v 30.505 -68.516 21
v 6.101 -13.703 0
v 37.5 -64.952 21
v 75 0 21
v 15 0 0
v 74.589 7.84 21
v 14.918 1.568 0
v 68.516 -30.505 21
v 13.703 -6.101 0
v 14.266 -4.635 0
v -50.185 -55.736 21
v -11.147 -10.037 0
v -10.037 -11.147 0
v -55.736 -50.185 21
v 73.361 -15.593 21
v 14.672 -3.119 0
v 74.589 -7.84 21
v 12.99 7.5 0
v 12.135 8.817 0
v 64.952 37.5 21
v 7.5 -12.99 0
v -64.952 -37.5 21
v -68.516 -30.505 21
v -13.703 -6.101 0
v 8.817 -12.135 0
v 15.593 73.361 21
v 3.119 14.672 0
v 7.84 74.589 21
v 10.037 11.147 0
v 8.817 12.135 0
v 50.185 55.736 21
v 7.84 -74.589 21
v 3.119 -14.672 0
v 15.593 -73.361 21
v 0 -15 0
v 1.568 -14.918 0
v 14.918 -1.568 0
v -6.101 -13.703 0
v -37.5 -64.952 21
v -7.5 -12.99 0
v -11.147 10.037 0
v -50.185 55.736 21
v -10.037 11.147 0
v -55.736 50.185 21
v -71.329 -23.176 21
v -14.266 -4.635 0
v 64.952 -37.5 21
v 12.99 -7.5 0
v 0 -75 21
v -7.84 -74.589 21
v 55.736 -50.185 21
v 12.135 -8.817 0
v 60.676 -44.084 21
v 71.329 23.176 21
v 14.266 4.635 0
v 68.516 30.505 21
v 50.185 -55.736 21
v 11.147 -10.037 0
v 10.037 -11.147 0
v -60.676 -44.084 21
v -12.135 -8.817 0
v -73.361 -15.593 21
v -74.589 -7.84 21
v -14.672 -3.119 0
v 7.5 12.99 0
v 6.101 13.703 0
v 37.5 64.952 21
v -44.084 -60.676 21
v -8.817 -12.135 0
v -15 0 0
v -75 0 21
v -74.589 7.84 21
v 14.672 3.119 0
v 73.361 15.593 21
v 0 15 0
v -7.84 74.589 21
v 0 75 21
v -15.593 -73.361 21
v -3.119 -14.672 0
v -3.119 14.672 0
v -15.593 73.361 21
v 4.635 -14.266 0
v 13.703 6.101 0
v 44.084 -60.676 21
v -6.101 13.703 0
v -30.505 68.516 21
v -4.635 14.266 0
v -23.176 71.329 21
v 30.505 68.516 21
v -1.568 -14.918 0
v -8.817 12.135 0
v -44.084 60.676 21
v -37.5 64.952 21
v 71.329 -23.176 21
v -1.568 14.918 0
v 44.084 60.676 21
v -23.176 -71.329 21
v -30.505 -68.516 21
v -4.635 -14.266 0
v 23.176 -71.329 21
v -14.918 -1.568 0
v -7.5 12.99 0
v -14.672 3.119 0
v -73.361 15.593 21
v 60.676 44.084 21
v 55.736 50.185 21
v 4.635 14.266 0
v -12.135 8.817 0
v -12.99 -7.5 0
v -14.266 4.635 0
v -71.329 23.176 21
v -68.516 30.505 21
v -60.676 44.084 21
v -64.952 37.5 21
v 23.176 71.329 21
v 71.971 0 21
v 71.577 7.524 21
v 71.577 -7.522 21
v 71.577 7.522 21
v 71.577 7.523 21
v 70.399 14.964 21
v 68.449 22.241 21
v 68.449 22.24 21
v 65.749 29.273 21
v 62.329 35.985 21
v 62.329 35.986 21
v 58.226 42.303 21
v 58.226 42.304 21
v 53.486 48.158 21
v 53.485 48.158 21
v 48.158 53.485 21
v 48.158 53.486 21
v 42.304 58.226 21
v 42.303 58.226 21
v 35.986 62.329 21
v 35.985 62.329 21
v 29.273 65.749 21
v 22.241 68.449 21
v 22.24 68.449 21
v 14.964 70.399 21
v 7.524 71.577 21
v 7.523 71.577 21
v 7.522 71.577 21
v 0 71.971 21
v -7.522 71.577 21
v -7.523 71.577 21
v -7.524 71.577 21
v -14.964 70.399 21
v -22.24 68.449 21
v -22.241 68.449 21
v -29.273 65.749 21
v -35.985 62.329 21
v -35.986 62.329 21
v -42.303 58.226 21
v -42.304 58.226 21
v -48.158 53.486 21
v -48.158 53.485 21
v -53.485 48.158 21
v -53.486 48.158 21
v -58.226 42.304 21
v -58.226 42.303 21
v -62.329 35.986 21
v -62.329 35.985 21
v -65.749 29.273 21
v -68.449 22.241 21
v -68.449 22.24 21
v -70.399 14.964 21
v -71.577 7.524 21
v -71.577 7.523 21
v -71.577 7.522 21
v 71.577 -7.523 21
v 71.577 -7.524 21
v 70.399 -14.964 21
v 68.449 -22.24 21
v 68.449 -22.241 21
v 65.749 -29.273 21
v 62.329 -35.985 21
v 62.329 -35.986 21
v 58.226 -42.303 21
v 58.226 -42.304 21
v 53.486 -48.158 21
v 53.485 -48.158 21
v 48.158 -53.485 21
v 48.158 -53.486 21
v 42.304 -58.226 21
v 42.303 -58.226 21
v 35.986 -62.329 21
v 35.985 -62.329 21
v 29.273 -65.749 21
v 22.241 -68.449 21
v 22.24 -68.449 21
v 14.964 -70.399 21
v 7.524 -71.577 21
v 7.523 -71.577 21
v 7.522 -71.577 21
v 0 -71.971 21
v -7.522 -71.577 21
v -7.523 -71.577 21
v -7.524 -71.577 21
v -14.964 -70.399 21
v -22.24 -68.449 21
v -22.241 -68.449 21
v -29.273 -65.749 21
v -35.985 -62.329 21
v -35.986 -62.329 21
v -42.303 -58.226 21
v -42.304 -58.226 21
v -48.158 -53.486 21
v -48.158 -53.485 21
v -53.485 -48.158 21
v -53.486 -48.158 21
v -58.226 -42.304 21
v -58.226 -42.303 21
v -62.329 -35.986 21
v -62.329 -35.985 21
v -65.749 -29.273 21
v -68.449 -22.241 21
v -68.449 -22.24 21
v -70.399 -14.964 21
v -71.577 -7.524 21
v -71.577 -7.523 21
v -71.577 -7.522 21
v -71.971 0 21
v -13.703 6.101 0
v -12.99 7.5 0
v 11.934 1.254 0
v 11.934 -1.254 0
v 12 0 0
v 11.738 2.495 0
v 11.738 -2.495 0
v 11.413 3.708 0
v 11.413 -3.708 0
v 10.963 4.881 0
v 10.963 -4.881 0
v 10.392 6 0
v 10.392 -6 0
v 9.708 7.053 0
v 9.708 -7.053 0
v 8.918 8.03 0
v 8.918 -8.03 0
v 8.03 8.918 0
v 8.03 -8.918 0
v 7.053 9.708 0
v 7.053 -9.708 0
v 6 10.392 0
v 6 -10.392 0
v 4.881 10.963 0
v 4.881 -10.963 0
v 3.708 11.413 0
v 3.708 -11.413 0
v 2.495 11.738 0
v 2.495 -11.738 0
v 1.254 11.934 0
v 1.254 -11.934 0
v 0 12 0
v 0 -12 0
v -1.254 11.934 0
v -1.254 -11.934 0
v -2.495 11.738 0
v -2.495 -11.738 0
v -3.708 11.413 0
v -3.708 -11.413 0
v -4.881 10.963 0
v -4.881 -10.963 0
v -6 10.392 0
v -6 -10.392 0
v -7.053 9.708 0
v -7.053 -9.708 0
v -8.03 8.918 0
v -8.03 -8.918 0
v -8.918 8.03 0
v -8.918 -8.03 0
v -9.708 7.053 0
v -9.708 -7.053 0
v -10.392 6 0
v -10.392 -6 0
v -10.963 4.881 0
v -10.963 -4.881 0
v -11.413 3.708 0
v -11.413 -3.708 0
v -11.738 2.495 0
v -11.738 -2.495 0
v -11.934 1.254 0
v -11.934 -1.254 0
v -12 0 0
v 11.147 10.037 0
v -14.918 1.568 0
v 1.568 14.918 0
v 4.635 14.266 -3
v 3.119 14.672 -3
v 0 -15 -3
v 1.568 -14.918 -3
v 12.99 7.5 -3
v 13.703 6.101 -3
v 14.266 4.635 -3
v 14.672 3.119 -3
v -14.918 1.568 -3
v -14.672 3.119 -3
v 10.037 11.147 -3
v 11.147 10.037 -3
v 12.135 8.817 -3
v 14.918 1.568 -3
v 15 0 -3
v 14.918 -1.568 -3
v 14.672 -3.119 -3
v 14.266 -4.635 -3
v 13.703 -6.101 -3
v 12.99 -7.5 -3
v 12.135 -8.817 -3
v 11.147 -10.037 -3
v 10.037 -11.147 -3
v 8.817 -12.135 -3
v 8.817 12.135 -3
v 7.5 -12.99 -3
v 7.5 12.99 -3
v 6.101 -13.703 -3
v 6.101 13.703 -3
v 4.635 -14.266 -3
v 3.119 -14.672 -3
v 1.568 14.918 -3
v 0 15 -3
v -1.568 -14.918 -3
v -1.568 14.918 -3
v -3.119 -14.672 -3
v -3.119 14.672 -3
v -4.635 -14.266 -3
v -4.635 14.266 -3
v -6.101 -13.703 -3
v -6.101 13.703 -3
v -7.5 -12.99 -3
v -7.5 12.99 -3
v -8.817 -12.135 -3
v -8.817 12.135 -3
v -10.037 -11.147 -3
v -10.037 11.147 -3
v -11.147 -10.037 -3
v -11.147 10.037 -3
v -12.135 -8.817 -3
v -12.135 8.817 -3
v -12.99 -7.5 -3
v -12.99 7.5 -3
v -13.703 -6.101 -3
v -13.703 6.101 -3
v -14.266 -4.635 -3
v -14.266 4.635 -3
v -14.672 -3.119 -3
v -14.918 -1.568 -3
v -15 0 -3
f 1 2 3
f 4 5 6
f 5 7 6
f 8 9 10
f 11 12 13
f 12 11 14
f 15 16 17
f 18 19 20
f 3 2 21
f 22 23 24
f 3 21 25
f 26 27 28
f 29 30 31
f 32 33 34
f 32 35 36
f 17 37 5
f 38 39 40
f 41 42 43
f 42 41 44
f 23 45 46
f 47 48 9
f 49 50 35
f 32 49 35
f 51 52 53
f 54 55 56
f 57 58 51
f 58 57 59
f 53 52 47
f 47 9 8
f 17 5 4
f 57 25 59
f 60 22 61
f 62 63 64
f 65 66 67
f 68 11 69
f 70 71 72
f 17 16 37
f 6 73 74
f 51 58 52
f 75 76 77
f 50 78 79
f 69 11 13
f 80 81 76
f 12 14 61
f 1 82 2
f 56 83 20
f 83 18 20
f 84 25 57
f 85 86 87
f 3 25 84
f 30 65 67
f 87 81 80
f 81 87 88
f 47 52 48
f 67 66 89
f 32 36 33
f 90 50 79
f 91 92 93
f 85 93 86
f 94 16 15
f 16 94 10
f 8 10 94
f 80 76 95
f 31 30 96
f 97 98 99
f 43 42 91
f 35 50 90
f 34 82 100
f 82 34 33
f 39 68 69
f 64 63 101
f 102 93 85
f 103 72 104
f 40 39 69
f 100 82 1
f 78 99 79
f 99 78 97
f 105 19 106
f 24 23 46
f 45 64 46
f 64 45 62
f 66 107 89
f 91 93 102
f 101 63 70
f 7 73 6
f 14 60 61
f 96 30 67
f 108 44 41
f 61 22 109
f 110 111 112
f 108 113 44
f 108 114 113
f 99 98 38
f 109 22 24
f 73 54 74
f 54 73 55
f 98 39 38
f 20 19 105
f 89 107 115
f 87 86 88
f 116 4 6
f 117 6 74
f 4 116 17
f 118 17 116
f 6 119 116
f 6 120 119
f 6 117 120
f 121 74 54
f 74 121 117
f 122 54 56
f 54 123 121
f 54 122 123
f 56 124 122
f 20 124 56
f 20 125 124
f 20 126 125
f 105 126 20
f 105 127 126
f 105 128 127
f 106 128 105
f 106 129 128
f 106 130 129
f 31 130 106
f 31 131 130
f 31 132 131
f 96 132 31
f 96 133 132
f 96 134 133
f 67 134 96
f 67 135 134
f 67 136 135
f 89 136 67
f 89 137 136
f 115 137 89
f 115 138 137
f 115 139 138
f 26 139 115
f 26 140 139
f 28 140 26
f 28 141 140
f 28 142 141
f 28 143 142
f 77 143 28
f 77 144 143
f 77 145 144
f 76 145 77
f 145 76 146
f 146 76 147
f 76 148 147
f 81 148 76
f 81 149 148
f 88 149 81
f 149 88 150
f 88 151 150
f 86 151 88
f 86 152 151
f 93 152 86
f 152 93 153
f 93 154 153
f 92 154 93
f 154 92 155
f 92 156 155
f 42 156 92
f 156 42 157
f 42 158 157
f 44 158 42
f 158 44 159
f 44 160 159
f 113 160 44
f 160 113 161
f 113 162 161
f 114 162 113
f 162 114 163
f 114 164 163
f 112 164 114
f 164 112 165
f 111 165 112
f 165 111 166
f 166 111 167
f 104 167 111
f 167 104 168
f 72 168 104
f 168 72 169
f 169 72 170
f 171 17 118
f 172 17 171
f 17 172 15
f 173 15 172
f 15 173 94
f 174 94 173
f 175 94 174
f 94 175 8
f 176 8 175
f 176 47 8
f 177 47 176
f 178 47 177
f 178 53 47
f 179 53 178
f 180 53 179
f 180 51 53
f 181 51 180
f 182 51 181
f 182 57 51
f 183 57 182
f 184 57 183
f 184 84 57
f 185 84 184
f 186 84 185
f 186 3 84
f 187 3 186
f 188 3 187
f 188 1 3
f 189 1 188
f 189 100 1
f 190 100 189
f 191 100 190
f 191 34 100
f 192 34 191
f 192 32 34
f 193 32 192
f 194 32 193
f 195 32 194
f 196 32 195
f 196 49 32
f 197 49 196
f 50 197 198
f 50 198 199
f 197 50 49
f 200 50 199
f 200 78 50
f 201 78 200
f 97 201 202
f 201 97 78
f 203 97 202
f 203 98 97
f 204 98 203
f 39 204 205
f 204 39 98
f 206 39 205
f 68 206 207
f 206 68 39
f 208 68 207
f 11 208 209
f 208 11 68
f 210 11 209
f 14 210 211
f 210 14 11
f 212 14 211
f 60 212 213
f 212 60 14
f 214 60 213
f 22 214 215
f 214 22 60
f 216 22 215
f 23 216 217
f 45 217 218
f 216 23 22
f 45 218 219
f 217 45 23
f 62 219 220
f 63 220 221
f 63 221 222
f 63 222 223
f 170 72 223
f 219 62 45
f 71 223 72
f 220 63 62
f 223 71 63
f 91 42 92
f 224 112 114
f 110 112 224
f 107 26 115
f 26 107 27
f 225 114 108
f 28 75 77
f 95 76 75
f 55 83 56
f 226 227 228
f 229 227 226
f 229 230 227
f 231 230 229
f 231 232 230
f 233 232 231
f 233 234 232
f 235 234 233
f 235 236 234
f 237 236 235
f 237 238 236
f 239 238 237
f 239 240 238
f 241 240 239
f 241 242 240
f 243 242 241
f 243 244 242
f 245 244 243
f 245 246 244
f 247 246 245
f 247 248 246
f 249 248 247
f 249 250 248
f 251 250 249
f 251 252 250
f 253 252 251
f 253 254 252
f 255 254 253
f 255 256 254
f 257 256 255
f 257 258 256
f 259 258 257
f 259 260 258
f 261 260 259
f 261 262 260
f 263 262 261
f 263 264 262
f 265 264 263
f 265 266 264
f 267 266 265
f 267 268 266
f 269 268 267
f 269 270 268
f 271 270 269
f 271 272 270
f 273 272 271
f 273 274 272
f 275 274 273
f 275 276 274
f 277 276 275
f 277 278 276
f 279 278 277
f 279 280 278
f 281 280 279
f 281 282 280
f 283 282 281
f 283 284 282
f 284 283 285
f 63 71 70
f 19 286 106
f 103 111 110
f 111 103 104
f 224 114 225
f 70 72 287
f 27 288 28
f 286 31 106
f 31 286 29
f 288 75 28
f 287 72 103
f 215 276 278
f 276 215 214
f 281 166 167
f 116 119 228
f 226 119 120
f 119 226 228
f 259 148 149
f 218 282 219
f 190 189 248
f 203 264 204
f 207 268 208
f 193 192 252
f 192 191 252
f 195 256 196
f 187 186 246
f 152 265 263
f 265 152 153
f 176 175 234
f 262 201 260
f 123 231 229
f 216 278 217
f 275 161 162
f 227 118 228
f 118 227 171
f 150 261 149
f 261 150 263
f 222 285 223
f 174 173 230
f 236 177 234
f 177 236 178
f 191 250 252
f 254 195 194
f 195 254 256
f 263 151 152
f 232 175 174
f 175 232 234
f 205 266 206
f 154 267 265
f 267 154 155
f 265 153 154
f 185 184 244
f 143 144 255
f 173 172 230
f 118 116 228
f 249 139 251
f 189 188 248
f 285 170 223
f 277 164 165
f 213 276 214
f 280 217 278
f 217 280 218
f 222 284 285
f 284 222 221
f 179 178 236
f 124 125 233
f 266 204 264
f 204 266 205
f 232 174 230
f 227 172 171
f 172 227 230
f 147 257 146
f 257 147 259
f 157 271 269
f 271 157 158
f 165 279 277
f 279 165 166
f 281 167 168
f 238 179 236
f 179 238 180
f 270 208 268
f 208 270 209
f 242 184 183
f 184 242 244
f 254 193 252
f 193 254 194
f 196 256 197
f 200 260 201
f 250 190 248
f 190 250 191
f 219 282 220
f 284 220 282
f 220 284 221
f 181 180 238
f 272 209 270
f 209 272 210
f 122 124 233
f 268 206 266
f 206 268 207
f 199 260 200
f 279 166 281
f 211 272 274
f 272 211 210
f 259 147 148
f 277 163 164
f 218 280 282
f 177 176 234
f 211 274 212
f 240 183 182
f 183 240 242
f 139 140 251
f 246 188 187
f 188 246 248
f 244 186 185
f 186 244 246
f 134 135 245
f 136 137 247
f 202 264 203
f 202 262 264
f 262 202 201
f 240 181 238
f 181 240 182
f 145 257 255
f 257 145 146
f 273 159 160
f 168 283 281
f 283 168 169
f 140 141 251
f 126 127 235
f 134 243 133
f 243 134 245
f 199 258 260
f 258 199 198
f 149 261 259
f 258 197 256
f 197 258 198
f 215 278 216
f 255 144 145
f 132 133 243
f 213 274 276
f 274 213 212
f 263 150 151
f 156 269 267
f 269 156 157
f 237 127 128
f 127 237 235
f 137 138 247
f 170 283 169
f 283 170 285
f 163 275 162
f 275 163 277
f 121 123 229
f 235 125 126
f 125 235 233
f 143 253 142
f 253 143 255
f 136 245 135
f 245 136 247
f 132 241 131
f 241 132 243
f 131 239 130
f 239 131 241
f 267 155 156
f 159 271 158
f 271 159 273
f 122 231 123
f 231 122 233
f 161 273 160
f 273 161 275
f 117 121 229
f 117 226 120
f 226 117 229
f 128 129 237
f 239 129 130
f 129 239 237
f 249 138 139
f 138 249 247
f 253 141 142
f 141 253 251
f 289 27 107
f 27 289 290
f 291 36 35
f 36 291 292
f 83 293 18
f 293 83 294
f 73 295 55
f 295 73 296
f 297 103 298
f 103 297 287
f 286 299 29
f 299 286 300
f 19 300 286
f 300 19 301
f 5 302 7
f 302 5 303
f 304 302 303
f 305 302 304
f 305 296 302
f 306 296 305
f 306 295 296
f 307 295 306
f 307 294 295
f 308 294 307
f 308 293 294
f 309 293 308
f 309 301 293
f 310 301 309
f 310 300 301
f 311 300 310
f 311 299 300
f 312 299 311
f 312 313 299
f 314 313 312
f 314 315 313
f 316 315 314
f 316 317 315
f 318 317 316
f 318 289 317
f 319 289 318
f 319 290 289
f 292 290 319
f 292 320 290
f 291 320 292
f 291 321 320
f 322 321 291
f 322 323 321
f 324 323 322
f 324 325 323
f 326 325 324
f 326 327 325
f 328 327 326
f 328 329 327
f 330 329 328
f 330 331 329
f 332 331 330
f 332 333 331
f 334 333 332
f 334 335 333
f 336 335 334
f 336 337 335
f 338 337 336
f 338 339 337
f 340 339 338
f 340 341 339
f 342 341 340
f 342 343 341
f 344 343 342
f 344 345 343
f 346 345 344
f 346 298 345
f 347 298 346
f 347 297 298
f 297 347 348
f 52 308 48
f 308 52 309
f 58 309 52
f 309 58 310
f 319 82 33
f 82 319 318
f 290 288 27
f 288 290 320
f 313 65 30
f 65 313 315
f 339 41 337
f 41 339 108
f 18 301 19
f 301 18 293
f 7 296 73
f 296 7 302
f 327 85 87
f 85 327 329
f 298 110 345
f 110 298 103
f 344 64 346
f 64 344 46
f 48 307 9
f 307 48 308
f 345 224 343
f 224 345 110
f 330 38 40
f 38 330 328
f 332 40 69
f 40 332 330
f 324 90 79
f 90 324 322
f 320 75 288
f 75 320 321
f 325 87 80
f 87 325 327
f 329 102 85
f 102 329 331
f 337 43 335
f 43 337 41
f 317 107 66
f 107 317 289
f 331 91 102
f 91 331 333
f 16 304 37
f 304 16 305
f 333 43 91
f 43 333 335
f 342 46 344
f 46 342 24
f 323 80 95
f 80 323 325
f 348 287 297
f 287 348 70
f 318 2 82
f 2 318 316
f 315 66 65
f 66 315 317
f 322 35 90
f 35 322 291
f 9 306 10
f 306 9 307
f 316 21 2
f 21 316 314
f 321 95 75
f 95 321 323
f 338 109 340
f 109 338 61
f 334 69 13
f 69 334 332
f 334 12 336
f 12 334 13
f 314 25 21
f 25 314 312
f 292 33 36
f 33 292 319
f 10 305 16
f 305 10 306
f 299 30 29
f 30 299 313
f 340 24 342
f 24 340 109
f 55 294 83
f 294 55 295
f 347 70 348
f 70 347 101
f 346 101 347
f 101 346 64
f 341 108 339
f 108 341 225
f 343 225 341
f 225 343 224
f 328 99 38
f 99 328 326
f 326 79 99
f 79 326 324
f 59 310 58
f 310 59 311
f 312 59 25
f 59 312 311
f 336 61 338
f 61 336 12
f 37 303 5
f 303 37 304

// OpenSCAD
$fn=60;
mirror([0, 0, -1]) cylinder(h=3, d=30);
difference() {
	cylinder(h=21, d1=30, d2=150);
	cylinder(h=21.01, d1=24, d2=144);
}
